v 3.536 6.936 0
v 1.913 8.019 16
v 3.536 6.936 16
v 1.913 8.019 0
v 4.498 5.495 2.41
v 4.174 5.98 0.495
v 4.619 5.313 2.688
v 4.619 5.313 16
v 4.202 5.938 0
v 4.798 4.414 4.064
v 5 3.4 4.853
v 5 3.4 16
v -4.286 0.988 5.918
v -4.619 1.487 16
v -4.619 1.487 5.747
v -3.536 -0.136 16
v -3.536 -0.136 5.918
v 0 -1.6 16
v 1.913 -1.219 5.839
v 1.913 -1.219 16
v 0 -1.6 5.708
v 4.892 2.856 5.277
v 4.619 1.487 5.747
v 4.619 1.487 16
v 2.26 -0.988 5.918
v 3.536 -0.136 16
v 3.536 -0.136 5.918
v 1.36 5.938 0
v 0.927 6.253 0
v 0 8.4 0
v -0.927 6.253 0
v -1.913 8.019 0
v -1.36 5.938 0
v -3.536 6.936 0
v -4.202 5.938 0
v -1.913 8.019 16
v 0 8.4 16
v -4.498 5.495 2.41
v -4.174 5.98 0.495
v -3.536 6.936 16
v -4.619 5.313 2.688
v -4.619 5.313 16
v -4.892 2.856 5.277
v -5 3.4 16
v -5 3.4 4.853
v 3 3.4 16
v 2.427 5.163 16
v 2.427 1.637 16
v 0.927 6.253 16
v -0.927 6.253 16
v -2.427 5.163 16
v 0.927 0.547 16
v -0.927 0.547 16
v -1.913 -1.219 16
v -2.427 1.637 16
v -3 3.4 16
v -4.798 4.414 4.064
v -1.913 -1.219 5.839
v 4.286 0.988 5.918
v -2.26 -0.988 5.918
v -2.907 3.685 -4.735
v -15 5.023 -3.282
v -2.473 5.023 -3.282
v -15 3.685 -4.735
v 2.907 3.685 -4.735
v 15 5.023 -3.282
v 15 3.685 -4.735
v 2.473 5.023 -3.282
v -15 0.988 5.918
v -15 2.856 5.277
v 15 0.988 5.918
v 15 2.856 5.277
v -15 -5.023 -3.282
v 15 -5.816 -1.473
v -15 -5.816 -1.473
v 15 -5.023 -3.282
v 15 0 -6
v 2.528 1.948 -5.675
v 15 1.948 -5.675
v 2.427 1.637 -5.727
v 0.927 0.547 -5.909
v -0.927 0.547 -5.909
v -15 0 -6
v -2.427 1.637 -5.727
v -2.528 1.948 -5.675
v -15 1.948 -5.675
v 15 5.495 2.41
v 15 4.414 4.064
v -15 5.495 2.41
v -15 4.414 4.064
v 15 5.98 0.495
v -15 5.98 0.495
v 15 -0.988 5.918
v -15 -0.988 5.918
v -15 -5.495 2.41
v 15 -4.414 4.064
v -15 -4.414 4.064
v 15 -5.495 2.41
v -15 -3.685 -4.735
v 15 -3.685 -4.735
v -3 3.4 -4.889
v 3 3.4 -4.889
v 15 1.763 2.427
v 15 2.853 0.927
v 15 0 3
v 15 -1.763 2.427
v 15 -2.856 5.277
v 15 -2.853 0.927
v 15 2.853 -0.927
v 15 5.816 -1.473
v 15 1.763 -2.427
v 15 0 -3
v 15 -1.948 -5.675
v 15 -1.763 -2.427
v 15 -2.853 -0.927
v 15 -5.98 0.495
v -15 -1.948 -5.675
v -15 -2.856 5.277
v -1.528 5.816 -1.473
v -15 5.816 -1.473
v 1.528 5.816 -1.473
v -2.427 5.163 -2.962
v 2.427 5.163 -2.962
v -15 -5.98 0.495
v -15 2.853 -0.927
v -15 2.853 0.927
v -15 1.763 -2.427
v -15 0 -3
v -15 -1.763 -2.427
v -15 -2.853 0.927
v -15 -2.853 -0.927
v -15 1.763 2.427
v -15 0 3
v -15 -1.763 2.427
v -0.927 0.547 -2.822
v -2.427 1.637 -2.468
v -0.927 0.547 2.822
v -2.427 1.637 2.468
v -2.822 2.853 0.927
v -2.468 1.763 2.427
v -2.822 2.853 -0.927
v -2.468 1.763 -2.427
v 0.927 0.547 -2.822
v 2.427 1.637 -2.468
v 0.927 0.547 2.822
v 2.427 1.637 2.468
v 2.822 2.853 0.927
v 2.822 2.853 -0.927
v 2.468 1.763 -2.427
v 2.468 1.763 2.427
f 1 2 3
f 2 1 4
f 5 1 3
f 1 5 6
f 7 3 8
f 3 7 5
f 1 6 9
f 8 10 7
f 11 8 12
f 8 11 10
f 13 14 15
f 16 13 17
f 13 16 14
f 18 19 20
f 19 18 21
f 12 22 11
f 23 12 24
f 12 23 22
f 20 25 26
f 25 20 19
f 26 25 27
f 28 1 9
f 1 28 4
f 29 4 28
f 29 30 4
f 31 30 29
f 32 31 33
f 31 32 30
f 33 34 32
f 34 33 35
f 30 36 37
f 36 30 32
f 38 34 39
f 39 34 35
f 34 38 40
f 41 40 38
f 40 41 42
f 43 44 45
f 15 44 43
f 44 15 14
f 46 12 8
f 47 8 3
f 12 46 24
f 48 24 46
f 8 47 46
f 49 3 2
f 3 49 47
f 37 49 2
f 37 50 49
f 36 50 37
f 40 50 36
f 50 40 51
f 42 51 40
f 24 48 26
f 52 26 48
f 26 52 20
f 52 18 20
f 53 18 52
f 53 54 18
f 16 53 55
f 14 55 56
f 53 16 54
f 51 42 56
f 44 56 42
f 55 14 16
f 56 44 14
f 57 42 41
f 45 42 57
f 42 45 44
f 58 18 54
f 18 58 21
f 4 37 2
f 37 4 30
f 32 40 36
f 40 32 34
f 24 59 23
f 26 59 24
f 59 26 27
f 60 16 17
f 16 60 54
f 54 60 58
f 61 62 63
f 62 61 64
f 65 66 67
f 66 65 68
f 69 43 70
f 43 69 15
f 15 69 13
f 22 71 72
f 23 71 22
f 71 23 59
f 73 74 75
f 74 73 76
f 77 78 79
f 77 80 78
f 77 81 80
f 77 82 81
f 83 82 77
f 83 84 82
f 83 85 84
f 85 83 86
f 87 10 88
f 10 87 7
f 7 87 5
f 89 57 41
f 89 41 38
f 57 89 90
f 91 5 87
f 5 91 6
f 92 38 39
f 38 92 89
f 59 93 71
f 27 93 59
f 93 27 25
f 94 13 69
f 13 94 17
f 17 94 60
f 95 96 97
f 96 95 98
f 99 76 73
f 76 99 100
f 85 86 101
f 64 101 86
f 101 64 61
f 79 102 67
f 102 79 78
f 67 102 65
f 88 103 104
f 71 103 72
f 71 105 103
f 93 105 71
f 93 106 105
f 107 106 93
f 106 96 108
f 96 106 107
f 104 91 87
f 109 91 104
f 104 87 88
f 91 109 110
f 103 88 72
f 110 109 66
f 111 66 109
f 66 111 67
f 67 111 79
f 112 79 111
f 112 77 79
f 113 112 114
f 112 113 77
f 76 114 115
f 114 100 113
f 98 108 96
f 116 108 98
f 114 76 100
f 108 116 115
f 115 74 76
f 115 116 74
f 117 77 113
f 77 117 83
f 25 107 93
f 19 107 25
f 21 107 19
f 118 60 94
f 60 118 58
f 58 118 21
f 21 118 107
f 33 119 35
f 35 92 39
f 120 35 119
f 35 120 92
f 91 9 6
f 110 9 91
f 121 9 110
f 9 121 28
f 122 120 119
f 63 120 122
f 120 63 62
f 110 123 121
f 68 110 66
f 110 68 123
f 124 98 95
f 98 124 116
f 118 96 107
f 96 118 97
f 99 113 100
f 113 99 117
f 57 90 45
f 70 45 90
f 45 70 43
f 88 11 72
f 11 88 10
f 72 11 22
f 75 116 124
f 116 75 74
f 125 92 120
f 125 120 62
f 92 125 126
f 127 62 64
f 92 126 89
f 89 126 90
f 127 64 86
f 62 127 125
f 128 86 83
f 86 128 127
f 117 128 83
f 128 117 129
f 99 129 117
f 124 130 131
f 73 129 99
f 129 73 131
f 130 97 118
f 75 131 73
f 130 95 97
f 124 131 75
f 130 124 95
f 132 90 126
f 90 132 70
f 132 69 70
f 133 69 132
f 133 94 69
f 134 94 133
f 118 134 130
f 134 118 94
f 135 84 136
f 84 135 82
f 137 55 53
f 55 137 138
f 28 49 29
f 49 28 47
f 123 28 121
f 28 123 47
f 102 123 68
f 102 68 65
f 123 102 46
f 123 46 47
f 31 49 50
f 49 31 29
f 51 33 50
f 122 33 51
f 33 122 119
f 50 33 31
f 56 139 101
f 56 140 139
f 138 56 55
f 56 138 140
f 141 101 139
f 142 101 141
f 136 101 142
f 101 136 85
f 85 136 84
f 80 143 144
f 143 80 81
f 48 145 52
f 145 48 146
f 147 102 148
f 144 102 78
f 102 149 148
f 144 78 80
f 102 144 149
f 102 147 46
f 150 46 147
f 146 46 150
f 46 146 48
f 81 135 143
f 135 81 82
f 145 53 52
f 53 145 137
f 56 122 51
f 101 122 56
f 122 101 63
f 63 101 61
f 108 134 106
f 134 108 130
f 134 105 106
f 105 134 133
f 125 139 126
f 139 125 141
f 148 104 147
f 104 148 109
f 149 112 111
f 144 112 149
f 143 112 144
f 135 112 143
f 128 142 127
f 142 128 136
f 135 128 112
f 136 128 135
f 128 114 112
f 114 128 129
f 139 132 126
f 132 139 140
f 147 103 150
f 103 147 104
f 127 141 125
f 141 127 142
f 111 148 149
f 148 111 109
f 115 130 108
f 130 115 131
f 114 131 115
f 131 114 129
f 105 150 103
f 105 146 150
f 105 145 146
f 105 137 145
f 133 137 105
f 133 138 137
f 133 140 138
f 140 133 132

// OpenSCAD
difference() {
    union() {
        translate([0,3.4,0])
          cylinder(r=5.0, h=16.0);
        translate([-15.0,0,0])
          rotate([0,90,0])
            cylinder(r=6.0, h=30.0);        
    }
    
    translate([0, 3.4, -15.0])
        cylinder(r=3.0, h=3*15.0);
    translate([-30.0, 0,0])
        rotate([0,90,0])
            cylinder(r=3.0, h=2*30.0);
}
